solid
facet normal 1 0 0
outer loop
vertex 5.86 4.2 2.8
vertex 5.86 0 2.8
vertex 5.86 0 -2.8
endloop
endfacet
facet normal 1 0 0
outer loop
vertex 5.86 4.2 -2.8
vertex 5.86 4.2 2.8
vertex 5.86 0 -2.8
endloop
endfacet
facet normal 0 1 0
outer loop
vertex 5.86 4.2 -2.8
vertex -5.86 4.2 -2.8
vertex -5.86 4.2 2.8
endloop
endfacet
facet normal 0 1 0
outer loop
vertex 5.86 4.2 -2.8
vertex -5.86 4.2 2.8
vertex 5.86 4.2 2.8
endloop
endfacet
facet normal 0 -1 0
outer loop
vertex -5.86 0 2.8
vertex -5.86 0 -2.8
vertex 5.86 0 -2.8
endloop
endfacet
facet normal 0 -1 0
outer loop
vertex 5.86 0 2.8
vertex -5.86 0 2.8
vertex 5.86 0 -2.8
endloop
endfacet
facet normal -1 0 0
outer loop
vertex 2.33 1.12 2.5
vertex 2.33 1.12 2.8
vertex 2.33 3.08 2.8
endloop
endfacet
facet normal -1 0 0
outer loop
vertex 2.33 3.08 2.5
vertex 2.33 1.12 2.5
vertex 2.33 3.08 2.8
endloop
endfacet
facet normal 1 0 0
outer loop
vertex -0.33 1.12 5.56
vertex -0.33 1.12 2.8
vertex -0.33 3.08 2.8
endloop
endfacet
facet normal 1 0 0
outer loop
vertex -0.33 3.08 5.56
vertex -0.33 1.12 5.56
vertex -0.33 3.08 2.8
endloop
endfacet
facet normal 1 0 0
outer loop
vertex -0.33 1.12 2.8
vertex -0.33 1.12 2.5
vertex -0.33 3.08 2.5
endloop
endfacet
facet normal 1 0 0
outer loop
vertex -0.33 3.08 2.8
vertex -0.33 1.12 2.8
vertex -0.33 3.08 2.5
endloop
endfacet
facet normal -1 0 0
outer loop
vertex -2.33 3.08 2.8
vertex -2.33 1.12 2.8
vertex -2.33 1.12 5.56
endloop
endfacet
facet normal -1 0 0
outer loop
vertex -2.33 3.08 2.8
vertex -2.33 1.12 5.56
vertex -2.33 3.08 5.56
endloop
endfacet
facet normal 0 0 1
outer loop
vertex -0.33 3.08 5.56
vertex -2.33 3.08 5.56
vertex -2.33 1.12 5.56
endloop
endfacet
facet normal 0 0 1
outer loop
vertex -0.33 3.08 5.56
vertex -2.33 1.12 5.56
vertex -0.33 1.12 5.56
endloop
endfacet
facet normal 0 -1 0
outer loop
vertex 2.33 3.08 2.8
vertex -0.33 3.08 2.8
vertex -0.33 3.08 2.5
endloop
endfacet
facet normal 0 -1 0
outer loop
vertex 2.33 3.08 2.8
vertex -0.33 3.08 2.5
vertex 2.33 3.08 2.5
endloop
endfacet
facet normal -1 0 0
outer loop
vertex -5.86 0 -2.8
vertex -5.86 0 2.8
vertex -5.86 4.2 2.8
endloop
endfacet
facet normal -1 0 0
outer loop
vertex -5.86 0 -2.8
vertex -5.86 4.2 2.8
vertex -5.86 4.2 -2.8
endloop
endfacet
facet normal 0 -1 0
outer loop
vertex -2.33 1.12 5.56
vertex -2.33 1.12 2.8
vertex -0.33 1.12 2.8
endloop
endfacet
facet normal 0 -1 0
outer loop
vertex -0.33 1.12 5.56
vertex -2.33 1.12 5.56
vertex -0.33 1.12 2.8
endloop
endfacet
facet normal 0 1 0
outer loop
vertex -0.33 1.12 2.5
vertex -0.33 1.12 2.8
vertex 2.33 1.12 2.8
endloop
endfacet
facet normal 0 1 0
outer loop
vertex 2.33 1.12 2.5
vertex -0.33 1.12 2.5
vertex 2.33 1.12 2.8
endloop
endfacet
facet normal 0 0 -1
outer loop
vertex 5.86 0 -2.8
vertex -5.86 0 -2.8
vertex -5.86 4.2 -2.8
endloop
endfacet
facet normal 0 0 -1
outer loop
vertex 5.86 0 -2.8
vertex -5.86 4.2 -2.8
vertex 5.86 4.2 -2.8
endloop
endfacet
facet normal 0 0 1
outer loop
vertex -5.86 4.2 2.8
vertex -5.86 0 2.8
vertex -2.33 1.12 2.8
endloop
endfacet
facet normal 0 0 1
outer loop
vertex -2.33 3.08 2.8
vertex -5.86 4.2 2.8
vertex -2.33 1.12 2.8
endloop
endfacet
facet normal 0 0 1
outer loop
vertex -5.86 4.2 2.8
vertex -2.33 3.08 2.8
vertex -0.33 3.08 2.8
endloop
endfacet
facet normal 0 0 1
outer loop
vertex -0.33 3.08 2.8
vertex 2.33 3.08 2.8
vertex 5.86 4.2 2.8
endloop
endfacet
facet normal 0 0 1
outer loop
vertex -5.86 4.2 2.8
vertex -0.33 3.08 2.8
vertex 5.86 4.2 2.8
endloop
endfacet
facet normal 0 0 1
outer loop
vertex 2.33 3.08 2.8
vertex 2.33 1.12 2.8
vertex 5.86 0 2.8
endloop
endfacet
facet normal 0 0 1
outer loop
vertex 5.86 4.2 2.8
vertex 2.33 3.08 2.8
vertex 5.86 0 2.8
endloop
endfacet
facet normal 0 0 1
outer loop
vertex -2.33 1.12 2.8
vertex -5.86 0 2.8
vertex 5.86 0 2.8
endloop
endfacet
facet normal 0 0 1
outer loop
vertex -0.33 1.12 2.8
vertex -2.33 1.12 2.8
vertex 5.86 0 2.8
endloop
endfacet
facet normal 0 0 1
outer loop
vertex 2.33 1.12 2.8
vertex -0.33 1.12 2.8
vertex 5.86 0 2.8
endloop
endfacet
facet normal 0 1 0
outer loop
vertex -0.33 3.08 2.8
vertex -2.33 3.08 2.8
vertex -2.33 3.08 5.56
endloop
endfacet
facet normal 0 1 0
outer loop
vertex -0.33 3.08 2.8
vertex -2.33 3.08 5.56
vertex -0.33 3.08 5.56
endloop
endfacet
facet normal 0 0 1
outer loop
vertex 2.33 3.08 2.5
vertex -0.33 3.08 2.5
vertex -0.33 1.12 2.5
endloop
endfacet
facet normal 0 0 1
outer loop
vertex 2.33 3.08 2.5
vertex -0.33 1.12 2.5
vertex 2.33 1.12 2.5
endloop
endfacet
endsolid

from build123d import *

# Parameters (mm, degrees)
SKETCH1_W           = 11.72
SKETCH1_H           = 5.6
BOSS_EXTRUDE1_DEPTH = 4.2
SKETCH2_W           = 2
SKETCH2_H           = 1.96
BOSS_EXTRUDE2_DEPTH = 2.76
SKETCH2_3_W         = 2.66
SKETCH2_3_H         = 1.96
CUT_EXTRUDE1_DEPTH  = 0.3


with BuildPart() as part:
    # Sketch1 → Boss-Extrude1 (new body)
    with BuildSketch(Plane(origin=(0, 0, 0), x_dir=(1, 0, 0), z_dir=(0, 1, 0))):
        Rectangle(SKETCH1_W, SKETCH1_H)
    extrude(amount=BOSS_EXTRUDE1_DEPTH)

    # Sketch2 → Boss-Extrude2 (add)
    with BuildSketch(Plane.XY.offset(2.8)):
        with Locations((-1.33, 2.1)):
            Rectangle(SKETCH2_W, SKETCH2_H)
    extrude(amount=BOSS_EXTRUDE2_DEPTH)

    # Sketch2<3> → Cut-Extrude1 (cut)
    with BuildSketch(Plane.XY.offset(2.8)):
        with Locations((1, 2.1)):
            Rectangle(SKETCH2_3_W, SKETCH2_3_H)
    extrude(amount=-CUT_EXTRUDE1_DEPTH, mode=Mode.SUBTRACT)


solid = part.part
